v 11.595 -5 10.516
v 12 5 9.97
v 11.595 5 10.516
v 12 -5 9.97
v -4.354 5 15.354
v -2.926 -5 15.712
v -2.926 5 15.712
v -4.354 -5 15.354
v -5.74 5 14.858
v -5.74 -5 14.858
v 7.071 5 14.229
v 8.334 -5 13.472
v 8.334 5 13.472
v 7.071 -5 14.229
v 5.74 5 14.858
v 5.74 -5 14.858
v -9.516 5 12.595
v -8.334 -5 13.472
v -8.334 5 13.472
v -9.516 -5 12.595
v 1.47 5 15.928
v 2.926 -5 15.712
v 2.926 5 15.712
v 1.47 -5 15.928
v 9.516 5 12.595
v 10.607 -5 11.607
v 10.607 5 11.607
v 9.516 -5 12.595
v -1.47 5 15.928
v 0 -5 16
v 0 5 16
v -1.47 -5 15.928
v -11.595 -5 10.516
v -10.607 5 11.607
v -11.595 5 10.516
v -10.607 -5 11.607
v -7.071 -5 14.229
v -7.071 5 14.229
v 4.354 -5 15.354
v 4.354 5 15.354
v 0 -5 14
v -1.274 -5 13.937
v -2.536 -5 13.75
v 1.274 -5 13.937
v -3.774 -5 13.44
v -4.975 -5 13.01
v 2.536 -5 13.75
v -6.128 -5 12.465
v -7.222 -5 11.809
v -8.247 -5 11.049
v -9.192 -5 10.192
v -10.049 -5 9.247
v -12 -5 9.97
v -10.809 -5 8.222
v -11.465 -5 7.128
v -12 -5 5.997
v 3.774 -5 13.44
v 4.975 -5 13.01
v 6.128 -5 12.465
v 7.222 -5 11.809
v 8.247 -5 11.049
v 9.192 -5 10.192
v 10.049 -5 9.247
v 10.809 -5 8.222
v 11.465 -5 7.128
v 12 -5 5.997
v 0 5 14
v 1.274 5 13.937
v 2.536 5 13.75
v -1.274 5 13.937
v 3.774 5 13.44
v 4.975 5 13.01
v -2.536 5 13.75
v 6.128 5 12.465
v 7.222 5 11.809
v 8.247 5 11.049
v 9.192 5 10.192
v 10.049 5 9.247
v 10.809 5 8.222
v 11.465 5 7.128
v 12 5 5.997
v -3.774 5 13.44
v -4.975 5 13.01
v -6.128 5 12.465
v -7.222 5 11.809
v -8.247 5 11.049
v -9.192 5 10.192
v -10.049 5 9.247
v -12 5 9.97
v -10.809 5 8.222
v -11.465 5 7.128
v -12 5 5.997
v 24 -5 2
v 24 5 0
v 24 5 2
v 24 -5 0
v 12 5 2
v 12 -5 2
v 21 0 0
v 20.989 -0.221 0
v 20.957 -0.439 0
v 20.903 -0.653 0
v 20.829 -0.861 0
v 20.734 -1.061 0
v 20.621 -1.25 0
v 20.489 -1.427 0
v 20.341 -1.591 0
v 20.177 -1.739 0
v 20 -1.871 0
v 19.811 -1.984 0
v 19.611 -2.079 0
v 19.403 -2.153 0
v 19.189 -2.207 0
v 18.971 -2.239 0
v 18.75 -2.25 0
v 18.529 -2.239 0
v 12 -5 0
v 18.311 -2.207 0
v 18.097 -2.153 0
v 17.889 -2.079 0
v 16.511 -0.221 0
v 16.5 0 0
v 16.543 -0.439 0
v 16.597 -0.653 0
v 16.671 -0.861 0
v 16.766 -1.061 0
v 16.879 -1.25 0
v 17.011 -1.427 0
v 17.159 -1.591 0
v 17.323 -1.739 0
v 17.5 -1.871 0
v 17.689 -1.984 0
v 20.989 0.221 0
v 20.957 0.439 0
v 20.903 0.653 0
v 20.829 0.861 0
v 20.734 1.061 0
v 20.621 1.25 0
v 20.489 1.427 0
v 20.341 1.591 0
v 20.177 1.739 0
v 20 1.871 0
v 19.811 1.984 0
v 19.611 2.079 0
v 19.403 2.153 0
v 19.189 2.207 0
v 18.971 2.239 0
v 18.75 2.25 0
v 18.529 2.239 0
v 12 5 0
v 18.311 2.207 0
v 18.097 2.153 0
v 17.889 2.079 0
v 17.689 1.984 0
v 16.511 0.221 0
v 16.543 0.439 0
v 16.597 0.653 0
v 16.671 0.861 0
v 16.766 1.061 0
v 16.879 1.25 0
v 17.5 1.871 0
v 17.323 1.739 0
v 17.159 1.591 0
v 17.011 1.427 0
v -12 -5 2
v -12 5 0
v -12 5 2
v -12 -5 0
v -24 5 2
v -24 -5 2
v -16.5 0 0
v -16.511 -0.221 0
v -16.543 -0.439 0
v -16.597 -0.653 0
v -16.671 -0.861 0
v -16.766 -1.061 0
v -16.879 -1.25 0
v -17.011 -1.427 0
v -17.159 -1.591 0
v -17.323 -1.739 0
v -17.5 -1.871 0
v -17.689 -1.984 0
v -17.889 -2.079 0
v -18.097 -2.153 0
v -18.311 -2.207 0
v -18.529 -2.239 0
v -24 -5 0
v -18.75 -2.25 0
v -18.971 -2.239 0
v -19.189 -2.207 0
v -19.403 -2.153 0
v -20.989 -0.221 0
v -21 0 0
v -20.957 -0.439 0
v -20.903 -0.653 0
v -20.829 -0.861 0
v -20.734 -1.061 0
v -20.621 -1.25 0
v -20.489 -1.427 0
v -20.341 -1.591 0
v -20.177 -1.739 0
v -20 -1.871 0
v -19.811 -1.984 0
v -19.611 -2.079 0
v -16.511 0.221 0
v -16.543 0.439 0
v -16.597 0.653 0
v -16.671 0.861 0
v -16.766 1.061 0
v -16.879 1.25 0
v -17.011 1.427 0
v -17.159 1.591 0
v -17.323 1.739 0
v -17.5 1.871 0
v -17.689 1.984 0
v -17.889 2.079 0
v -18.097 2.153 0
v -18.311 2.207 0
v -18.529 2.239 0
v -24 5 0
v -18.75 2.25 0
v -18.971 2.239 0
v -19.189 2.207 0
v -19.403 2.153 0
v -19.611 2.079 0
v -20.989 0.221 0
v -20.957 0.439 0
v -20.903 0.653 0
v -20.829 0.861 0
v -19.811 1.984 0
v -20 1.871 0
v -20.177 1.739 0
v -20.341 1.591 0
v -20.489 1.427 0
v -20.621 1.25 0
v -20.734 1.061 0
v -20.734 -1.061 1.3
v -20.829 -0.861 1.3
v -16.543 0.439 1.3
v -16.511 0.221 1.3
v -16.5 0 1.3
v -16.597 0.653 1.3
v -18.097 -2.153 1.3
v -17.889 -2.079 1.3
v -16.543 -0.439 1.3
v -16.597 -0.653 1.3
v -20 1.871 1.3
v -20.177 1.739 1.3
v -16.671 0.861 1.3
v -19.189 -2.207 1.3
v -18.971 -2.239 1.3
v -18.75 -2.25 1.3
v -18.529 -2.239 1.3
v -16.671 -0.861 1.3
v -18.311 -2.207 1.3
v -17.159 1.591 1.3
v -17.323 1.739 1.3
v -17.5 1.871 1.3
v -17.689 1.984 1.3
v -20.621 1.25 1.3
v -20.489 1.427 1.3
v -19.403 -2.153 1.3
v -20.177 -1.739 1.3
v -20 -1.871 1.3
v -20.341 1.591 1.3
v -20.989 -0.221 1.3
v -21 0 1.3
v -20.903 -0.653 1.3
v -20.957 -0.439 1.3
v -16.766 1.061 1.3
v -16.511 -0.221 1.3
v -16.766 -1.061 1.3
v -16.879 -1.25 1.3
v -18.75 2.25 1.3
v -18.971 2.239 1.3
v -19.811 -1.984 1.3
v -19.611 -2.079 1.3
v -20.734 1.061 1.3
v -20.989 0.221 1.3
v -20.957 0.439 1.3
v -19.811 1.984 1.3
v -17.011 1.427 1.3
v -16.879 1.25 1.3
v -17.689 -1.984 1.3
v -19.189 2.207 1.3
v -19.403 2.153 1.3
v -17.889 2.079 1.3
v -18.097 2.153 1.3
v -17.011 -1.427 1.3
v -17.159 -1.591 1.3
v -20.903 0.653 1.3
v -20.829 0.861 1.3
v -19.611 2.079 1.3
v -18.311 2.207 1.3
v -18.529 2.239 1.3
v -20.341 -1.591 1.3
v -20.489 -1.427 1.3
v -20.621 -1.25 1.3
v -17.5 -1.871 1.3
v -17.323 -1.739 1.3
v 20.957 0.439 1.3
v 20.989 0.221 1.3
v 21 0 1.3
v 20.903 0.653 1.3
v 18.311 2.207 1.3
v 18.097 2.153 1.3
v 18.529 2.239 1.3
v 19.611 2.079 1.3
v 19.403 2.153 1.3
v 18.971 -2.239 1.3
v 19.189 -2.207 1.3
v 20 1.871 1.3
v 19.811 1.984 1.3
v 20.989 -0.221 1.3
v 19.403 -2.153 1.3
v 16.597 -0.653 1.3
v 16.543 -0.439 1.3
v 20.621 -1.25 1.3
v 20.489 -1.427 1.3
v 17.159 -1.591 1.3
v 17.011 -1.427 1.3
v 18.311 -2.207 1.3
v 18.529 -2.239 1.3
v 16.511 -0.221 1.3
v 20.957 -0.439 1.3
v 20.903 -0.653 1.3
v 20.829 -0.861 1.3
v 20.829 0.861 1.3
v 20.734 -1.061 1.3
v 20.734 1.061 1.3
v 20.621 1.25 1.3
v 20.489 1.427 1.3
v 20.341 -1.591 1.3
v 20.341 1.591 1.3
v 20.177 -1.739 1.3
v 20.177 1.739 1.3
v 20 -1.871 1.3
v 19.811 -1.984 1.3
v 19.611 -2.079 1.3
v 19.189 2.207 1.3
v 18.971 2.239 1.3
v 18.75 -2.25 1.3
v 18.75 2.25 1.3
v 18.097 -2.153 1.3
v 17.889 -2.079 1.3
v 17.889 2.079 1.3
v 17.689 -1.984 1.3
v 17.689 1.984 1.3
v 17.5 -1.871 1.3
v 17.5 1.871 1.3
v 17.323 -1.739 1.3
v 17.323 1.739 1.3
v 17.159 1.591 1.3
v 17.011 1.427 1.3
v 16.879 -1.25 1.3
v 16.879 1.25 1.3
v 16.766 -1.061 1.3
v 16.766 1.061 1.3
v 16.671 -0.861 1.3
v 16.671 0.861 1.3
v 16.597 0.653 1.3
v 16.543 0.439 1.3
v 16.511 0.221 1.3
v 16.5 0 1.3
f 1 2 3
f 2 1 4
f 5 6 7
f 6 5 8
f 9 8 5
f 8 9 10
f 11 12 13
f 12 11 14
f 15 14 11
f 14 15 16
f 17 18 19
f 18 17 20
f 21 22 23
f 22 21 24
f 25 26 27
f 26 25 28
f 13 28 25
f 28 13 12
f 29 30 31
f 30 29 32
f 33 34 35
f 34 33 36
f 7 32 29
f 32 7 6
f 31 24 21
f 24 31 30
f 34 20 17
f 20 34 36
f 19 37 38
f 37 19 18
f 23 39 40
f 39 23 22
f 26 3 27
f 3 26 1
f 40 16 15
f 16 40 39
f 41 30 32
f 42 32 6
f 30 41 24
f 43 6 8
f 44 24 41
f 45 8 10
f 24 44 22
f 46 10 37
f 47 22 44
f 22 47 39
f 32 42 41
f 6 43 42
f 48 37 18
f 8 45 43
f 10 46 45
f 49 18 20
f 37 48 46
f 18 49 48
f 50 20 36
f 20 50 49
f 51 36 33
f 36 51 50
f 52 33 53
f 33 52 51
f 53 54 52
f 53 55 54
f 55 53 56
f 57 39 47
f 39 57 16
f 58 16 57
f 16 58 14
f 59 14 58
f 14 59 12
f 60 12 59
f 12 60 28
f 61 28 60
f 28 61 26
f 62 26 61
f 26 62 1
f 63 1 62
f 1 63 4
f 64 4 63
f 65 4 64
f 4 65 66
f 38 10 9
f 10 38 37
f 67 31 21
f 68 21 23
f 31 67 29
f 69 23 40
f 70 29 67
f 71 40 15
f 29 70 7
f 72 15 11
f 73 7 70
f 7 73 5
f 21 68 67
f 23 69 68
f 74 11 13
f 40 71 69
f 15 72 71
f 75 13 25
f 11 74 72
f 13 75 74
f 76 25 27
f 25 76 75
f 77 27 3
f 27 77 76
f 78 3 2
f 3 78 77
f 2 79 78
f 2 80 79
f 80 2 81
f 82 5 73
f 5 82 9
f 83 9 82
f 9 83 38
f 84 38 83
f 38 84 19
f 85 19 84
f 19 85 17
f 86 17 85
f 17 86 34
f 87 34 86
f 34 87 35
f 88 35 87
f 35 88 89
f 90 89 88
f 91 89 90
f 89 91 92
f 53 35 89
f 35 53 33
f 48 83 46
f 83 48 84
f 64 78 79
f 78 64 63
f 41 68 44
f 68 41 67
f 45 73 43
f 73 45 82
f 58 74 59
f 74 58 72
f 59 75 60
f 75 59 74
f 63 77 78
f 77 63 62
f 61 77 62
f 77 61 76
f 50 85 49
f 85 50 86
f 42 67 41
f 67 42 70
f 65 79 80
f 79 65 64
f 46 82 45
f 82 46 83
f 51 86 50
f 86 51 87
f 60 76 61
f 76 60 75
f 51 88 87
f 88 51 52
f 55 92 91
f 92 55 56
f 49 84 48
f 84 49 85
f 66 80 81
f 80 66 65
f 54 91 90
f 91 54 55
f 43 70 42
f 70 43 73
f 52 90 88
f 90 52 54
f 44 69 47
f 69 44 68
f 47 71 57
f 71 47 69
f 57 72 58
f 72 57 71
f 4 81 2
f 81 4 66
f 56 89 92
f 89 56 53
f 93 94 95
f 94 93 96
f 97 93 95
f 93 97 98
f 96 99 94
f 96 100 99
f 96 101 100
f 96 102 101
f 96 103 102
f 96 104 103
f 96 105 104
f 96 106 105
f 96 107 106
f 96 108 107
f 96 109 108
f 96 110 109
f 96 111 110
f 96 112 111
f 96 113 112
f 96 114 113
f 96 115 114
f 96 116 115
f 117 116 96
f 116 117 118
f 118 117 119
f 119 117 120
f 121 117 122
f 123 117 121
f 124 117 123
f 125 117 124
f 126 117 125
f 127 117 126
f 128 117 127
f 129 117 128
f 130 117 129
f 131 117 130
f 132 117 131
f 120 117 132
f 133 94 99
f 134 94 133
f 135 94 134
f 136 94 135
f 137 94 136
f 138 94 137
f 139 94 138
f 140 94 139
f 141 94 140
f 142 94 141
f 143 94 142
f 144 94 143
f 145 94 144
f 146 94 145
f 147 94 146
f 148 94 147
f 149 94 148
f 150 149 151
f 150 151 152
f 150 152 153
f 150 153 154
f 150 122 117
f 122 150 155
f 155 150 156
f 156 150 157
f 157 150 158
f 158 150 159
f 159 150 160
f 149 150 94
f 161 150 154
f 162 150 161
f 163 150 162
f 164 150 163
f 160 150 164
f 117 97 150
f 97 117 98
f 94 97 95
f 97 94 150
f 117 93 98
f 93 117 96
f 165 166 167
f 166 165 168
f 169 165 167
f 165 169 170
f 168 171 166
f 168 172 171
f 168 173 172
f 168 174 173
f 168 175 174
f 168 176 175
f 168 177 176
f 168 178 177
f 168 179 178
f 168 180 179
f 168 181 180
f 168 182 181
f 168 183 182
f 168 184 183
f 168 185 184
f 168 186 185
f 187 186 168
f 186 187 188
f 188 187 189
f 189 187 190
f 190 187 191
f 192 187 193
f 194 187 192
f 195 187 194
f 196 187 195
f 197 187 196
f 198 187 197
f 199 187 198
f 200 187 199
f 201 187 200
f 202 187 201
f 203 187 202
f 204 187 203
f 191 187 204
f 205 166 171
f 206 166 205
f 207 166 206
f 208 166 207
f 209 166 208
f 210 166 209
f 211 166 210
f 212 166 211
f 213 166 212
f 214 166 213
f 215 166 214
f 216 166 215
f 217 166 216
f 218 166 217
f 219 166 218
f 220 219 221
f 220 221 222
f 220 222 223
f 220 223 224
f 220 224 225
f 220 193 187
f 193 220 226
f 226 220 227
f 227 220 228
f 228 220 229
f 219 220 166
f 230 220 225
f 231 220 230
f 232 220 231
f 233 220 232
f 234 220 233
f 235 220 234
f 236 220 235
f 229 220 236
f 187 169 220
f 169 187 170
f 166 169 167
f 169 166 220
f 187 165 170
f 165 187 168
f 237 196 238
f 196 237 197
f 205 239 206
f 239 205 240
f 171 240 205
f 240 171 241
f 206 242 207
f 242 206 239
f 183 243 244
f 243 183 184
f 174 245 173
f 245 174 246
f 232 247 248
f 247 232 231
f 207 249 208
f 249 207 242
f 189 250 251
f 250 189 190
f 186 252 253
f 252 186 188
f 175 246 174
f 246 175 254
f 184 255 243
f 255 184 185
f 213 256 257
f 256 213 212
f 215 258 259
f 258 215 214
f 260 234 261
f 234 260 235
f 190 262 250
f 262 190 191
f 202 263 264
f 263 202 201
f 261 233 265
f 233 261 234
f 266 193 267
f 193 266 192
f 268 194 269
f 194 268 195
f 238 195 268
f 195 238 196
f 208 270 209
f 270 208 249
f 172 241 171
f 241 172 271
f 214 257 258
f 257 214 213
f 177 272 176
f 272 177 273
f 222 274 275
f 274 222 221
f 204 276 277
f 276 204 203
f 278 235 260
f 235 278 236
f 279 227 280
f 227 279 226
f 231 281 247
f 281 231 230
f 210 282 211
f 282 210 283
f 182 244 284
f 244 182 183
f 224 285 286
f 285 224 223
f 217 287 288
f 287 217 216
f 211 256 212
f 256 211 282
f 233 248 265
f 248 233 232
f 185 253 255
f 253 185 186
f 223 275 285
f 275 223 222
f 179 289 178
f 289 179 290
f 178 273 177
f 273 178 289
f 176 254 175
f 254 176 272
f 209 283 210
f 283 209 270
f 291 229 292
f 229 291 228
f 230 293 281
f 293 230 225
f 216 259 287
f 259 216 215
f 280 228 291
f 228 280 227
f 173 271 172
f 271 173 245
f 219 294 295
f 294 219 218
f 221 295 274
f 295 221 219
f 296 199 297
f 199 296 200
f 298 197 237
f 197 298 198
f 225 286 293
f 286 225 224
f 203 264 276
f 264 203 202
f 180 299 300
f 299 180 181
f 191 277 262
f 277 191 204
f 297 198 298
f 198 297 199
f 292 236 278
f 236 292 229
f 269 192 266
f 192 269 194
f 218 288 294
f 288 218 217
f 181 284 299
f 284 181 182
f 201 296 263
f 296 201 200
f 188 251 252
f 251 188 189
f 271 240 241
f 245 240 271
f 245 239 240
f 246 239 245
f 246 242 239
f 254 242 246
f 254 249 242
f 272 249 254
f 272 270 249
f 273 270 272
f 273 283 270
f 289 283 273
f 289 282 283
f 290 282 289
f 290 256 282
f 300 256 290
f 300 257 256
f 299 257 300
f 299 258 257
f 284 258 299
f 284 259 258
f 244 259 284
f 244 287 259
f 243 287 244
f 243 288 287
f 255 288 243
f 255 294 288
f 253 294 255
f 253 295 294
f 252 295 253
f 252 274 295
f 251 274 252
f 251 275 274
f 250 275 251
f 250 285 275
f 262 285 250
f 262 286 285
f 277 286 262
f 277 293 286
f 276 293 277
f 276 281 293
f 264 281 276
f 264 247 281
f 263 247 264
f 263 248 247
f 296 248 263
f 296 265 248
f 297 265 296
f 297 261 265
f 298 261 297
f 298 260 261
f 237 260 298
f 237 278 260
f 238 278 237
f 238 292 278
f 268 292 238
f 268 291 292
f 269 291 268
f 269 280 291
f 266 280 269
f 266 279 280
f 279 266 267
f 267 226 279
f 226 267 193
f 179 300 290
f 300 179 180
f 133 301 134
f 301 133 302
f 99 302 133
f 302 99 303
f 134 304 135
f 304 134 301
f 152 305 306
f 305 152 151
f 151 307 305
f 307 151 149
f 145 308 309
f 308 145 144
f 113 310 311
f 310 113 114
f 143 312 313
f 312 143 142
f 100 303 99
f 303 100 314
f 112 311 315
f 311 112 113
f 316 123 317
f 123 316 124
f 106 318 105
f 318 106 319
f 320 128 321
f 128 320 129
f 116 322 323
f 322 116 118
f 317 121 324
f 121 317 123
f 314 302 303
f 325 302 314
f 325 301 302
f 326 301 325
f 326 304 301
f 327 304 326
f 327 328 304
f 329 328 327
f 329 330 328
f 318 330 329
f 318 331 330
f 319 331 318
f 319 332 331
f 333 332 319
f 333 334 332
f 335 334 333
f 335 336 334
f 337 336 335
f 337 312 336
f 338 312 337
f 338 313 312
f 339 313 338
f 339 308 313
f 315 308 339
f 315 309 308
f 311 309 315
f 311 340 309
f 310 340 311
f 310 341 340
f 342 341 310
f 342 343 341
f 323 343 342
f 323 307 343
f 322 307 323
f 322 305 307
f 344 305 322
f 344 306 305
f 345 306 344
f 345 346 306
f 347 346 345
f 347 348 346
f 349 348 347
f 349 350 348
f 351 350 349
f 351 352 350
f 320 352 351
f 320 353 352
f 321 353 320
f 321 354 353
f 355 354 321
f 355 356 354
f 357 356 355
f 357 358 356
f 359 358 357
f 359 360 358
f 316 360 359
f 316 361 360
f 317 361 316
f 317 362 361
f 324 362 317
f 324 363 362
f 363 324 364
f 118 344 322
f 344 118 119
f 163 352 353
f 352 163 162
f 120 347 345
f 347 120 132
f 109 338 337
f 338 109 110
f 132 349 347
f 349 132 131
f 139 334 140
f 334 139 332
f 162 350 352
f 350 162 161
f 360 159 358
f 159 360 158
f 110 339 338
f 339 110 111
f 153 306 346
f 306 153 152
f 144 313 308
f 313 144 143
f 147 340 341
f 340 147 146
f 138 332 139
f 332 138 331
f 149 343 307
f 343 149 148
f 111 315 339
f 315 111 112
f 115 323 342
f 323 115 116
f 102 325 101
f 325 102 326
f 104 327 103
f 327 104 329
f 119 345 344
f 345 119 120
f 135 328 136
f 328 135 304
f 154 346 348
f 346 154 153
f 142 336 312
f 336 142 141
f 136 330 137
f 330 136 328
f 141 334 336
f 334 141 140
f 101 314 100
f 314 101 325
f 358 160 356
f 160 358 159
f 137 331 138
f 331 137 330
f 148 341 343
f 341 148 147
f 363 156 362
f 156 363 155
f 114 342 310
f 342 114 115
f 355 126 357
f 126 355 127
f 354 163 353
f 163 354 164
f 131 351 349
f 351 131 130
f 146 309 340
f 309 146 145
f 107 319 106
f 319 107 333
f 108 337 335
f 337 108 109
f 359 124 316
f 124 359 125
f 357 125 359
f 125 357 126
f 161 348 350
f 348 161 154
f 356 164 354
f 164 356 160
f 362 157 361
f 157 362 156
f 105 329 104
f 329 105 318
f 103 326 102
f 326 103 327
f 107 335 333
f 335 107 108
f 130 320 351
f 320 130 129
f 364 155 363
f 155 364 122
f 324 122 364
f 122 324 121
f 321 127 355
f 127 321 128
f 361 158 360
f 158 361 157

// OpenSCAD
$fn=64;

L = 48.0;
W = 10.0;
H = 16.0;

t = 2.0;                 // strap thickness (Z)
tab_len = 12.0;          // each end tab length (X)
hole_d = 4.5;            // through-hole diameter
hole_edge_margin = 3.0;  // min edge margin in X from tab end

arch_span = L - 2*tab_len;          // X span of arched center
R = H - t/2;                        // outer radius to reach overall height
r = R - t;                          // inner radius
arch_center_x = 0;
arch_center_z = t/2;

module tab(sign=1){
    x0 = sign*(L/2 - tab_len/2);
    translate([x0, 0, t/2])
        cube([tab_len, W, t], center=true);
}

module arch(){
    translate([arch_center_x, 0, arch_center_z])
    intersection(){
        difference(){
            rotate([90,0,0]) cylinder(h=W, r=R, center=true);
            rotate([90,0,0]) cylinder(h=W+0.2, r=r, center=true);
        }
        translate([0,0,R/2])
            cube([arch_span, W+0.2, R], center=true);
    }
}

module strap_solid(){
    union(){
        arch();
        tab(1);
        tab(-1);
    }
}

module holes(){
    hole_x = L/2 - hole_edge_margin - hole_d/2;
    for (sx=[-1,1]){
        translate([sx*hole_x, 0, 0])
            cylinder(h=t+0.6, d=hole_d, center=true);
    }
}

difference(){
    strap_solid();
    holes();
}
